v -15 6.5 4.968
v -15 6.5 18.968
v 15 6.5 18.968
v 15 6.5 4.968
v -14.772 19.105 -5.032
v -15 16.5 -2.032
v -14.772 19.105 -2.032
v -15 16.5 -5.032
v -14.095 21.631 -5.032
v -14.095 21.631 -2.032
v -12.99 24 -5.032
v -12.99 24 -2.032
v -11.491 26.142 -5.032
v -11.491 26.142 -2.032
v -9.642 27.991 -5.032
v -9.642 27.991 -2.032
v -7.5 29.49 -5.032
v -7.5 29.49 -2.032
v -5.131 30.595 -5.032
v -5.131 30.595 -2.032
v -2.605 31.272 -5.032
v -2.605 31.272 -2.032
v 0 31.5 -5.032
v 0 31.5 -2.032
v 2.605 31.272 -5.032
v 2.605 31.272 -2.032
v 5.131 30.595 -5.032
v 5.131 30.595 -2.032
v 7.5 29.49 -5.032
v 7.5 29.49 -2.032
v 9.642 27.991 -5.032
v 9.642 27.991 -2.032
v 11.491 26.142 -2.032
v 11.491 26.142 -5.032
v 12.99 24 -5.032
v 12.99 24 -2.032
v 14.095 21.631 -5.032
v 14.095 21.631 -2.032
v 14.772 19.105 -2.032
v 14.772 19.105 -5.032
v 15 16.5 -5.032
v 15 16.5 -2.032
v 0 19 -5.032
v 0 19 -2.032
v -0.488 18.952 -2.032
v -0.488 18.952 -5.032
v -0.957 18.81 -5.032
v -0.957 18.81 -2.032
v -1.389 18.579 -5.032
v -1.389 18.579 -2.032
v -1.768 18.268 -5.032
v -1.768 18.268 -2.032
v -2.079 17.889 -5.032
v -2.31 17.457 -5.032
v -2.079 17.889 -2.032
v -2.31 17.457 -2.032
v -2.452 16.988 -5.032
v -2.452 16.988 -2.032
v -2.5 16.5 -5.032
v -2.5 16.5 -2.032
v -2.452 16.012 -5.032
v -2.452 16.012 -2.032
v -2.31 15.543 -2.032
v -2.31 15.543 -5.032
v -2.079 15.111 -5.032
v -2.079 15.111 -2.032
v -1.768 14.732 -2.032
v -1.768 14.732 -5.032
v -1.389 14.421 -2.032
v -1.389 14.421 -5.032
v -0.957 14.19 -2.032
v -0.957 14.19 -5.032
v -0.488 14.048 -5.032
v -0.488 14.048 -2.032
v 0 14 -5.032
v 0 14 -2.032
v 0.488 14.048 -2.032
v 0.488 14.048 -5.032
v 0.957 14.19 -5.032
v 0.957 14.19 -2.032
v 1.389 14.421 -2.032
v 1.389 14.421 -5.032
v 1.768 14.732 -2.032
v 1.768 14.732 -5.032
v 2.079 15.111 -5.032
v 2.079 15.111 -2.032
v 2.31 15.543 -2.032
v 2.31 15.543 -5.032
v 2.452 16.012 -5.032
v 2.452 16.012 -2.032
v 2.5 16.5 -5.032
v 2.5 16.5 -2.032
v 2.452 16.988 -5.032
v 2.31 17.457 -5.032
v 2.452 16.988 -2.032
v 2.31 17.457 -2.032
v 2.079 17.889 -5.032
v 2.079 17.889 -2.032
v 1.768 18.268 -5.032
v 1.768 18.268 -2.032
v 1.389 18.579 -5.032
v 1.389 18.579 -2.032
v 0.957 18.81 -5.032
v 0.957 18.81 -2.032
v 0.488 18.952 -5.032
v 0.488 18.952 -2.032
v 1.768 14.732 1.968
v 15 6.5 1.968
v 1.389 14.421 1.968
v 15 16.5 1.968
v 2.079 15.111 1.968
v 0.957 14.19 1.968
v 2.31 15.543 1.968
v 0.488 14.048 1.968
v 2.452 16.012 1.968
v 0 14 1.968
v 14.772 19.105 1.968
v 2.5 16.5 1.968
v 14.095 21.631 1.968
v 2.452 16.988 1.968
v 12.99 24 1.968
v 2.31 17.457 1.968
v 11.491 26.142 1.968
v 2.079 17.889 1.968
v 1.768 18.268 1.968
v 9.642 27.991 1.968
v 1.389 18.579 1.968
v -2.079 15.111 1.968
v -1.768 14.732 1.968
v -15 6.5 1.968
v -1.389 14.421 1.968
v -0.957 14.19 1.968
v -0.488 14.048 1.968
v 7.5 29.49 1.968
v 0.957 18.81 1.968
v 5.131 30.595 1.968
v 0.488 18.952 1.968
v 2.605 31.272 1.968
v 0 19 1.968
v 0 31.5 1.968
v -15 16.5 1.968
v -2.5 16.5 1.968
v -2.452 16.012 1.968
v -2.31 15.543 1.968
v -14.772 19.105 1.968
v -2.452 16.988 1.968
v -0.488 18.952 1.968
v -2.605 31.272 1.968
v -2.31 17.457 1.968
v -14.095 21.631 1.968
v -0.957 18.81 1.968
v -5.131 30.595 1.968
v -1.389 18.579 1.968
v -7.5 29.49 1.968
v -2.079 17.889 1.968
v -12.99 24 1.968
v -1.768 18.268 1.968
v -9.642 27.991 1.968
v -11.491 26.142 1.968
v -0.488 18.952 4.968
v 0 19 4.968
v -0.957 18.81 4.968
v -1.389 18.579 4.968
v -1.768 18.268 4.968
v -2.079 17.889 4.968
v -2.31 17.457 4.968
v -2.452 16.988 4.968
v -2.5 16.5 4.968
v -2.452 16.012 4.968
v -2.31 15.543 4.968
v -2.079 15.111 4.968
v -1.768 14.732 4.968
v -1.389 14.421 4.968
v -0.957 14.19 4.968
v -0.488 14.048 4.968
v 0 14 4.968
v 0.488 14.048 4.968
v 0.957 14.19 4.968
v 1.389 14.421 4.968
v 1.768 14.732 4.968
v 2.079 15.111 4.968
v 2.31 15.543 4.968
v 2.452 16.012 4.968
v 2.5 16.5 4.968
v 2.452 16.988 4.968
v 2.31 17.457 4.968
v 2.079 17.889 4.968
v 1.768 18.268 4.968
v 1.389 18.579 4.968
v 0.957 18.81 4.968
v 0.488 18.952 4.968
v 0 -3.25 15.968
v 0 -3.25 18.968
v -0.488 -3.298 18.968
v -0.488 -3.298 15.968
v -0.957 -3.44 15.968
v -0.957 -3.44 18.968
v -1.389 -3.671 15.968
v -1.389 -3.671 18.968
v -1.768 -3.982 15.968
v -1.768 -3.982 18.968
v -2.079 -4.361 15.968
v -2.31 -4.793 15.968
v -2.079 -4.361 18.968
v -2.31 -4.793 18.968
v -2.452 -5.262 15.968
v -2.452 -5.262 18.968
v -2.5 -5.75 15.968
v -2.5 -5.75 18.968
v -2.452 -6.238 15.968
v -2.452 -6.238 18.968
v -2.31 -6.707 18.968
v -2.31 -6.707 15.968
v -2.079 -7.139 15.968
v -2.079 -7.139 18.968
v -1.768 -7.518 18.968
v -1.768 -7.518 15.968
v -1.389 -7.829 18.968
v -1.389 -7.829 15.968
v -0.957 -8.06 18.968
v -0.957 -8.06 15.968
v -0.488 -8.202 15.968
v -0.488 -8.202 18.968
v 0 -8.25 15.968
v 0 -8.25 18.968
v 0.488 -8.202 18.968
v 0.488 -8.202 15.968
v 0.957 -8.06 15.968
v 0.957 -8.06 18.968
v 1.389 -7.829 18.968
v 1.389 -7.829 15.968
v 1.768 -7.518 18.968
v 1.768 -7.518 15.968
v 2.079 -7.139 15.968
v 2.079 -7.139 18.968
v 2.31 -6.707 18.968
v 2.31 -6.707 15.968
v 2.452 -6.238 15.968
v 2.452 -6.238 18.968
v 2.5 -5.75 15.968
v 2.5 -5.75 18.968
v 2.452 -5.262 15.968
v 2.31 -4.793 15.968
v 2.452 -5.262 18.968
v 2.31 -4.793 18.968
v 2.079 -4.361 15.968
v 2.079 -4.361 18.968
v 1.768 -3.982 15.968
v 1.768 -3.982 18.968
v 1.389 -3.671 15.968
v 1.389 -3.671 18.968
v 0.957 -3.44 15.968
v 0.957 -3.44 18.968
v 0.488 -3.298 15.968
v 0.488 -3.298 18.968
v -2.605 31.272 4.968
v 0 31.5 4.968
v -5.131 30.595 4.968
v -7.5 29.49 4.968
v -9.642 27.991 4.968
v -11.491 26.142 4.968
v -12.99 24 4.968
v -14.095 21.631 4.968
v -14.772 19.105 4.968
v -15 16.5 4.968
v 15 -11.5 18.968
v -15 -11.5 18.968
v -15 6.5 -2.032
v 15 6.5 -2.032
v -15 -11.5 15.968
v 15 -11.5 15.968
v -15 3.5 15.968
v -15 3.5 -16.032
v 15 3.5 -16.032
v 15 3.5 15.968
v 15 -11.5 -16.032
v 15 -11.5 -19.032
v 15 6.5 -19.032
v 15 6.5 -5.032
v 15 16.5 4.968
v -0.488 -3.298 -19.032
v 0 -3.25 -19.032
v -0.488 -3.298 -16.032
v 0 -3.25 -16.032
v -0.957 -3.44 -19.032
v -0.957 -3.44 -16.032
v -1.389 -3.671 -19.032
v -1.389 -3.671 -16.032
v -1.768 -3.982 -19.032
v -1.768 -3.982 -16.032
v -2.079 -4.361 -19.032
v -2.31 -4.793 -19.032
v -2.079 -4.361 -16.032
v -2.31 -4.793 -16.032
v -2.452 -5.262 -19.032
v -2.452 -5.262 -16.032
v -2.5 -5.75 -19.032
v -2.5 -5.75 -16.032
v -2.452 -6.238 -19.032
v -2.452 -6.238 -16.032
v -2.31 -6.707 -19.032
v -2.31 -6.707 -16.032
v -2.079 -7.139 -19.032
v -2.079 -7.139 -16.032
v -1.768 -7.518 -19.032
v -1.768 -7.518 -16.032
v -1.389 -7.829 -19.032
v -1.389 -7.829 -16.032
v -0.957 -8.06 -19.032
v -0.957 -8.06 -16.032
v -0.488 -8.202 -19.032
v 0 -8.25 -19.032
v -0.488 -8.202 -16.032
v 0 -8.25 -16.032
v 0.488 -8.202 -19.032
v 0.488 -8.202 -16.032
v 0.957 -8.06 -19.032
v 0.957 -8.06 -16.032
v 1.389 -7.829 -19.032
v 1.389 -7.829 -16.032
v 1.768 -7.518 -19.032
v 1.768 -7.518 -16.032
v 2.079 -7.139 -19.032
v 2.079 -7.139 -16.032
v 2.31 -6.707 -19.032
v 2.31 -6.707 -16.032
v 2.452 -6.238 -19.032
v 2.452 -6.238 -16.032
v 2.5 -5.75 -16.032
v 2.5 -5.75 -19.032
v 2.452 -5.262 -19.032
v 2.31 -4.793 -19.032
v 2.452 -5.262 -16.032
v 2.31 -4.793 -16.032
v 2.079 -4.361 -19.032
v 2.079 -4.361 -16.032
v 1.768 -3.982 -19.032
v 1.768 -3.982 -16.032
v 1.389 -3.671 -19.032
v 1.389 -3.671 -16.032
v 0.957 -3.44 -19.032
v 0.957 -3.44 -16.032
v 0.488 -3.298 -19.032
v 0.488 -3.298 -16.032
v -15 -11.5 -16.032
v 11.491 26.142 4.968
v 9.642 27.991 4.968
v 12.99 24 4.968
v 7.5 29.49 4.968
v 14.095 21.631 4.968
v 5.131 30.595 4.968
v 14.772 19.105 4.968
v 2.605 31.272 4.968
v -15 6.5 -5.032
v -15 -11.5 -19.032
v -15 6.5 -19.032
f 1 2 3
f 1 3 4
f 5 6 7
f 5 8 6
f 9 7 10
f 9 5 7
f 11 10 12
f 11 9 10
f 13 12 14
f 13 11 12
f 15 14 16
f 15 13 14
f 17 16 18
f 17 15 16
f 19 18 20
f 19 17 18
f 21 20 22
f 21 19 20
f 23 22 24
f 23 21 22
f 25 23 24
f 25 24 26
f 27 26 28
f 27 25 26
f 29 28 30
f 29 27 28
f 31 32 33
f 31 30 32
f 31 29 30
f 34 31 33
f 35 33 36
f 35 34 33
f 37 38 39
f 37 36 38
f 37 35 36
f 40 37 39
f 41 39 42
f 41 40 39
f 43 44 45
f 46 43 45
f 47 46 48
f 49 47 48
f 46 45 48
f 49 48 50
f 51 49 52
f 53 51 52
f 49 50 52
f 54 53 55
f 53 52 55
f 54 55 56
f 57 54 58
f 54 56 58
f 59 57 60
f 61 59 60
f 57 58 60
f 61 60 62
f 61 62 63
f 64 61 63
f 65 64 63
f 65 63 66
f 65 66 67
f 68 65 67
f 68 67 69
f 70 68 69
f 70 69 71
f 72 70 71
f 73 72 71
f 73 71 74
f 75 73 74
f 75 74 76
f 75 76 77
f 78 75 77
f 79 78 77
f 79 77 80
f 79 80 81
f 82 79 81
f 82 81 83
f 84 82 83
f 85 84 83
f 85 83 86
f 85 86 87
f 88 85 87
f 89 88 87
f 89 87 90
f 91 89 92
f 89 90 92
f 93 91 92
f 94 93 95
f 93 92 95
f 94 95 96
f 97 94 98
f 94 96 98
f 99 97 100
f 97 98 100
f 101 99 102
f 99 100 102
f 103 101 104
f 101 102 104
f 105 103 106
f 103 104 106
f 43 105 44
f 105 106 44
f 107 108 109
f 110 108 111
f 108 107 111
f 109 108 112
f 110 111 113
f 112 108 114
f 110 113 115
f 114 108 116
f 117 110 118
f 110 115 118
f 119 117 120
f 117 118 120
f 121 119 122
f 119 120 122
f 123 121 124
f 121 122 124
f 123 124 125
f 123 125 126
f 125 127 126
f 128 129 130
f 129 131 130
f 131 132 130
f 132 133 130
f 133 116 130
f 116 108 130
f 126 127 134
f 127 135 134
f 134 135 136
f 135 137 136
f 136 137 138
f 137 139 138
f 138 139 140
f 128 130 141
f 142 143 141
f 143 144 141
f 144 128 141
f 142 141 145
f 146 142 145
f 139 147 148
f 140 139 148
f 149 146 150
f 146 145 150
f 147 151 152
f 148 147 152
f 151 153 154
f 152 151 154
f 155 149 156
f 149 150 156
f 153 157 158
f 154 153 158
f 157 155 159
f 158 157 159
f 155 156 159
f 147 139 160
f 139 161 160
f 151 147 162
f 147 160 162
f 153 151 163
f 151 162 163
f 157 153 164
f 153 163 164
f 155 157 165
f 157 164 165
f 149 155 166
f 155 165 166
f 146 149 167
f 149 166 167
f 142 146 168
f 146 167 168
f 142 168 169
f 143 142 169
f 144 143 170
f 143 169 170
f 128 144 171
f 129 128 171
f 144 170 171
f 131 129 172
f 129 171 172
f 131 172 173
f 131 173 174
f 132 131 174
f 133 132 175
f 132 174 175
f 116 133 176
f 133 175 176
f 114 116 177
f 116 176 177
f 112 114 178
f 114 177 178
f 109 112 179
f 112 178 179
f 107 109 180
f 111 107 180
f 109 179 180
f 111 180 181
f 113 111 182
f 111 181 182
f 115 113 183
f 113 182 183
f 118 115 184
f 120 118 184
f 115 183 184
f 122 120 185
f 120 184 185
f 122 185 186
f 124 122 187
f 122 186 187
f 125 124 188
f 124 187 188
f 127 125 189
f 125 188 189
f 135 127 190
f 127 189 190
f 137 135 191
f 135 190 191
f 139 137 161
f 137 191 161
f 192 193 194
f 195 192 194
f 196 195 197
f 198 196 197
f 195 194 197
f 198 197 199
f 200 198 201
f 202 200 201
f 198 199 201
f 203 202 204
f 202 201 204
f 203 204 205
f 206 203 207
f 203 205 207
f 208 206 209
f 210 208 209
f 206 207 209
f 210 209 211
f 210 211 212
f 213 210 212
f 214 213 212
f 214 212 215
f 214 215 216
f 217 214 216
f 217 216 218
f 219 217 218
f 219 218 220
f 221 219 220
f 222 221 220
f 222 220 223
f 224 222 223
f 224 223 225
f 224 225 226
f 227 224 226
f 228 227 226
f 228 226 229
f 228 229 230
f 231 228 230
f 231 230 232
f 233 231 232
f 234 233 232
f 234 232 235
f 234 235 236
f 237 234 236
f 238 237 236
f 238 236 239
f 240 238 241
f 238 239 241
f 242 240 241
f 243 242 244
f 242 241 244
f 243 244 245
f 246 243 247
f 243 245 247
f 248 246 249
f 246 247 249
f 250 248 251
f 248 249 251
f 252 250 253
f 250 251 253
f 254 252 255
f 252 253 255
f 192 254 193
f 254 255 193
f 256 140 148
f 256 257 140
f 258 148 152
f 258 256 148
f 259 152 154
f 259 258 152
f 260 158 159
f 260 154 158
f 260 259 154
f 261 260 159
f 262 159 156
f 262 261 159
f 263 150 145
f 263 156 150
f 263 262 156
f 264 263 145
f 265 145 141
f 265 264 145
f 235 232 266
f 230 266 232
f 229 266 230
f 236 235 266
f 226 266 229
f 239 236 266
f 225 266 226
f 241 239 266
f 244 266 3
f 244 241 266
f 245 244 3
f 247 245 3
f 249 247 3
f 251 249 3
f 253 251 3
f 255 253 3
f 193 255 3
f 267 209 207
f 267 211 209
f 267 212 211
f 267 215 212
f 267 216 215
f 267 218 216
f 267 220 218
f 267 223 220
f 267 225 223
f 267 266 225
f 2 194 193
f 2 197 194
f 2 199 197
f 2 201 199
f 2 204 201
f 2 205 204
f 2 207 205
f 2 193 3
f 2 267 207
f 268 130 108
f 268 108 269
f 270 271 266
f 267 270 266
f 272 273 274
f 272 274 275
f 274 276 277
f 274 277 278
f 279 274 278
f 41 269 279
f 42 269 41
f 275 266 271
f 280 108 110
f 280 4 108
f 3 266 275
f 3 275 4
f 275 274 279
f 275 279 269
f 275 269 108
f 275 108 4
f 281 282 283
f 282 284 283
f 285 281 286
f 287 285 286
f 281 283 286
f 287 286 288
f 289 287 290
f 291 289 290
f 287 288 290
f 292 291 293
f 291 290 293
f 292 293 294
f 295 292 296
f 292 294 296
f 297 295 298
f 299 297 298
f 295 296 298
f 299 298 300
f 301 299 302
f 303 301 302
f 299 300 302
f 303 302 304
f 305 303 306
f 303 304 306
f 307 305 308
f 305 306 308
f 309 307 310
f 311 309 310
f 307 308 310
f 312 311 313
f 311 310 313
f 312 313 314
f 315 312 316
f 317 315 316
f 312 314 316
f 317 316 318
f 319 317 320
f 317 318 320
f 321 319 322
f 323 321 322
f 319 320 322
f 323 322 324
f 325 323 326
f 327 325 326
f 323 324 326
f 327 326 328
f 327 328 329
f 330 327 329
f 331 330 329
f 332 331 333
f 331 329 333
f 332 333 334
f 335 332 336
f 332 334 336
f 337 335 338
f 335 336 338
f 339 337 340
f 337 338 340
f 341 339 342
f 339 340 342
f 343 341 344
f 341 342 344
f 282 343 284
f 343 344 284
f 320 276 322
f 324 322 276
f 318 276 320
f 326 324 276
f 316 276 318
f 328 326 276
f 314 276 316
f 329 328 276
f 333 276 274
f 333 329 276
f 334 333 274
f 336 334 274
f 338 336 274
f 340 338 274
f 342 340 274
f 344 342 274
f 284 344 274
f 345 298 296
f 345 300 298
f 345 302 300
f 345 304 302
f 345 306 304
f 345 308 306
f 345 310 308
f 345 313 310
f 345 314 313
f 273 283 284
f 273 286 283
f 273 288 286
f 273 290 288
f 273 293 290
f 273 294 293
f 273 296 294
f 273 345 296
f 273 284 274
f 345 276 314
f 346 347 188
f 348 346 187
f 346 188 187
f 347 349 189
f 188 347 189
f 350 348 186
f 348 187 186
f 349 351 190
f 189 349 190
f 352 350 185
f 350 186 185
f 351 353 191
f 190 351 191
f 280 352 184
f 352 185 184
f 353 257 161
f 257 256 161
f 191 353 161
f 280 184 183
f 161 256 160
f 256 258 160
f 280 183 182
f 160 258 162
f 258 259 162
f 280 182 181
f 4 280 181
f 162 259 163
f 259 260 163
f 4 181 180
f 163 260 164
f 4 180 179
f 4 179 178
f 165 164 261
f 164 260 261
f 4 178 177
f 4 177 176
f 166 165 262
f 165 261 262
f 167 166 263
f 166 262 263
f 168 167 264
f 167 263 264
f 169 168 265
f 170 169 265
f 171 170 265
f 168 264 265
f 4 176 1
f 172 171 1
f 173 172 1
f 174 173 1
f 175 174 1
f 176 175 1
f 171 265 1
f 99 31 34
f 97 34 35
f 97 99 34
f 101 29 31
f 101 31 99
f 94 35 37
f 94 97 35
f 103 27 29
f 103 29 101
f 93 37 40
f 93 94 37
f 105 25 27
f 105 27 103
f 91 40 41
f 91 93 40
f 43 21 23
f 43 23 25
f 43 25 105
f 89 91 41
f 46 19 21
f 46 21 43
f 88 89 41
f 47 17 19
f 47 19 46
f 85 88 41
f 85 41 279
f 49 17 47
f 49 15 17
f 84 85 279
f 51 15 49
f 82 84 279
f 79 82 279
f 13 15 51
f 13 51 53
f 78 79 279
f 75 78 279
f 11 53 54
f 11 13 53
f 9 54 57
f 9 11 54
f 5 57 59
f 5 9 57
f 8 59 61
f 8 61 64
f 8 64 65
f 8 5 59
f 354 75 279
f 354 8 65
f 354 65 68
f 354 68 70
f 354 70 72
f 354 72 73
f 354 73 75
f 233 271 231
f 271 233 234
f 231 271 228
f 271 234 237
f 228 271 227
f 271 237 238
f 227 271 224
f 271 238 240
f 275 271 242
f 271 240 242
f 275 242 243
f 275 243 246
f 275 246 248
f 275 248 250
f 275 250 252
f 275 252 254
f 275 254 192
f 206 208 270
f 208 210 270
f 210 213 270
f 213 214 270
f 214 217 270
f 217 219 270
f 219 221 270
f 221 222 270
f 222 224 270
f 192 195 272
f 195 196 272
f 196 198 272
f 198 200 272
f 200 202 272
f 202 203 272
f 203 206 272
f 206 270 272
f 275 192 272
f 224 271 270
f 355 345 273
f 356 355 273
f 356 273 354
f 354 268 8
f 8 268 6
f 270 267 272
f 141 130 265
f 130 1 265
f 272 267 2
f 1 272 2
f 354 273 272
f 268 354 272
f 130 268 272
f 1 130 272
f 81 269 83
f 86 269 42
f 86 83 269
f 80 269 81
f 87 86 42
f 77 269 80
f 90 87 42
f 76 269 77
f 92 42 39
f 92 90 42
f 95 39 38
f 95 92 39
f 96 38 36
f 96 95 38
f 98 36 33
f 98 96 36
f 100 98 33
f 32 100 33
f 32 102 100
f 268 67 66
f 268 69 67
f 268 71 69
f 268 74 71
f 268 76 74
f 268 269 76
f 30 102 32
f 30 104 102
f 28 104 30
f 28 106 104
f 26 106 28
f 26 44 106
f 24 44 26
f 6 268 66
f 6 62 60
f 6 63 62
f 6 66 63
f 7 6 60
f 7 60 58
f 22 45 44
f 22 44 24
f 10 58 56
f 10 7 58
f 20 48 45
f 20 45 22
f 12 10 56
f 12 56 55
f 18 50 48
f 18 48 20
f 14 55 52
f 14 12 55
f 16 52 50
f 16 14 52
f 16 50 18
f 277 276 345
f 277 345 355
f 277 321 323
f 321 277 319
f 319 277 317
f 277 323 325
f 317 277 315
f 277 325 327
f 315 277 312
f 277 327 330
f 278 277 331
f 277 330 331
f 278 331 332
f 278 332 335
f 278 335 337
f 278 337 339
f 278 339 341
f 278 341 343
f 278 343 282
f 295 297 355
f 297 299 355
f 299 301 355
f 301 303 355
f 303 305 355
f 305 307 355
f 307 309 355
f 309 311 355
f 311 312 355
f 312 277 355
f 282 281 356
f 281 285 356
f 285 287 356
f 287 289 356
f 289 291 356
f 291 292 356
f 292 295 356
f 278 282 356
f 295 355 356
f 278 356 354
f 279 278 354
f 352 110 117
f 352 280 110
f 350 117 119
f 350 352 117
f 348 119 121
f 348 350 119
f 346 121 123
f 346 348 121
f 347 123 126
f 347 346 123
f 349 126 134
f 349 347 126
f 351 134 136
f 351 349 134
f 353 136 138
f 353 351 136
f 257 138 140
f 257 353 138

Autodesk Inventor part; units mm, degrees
ref_plane "YZ Plane" through (0, 0, 0) normal (1, 0, 0) x (0, 1, 0)
ref_plane "XZ Plane" through (0, 0, 0) normal (0, 1, 0) x (-1, 0, 0)
ref_plane "XY Plane" through (0, 0, 0) normal (0, 0, 1) x (1, 0, 0)
sketch "Sketch2" plane through (0, 0, 0) normal (1, 0, 0) x (0, 1, 0)
  line L0 (0, -12.532) -> (0, 12.468) projected
  line L1 (0, 12.468) -> (3, 12.468) projected
  line L2 (3, -12.532) -> (3, 12.468) projected
  line L3 (0, -12.532) -> (3, -12.532) projected
  line L4 (-17, -12.532) -> (3, -12.532) projected
  line L5 (3, -12.532) -> (3, -15.532) projected
  line L6 (-17, -15.532) -> (3, -15.532) projected
  line L7 (-17, -12.532) -> (-17, -15.532) projected
  line L8 (3.5, -13.032) -> (3.5, -0.032)
  line L9 (-11.5, -16.032) -> (3.5, -16.032)
  line L10 (3.5, -13.032) -> (3.5, -16.032)
  line L11 (-11.5, -19.032) -> (6.5, -19.032)
  line L12 (3.5, -0.032) -> (6.5, -0.032) construction
  line L13 (-11.5, -16.032) -> (-11.5, -19.032)
  line L14 (6.5, -2.032) -> (31.5, -2.032)
  line L15 (31.5, -2.032) -> (31.5, -5.032)
  line L16 (31.5, -5.032) -> (6.5, -5.032)
  line L17 (3.5, 12.968) -> (3.5, -0.032)
  line L18 (-11.5, 15.968) -> (3.5, 15.968)
  line L19 (3.5, 12.968) -> (3.5, 15.968)
  line L20 (-11.5, 18.968) -> (6.5, 18.968)
  line L21 (-11.5, 15.968) -> (-11.5, 18.968)
  line L22 (6.5, 1.968) -> (31.5, 1.968)
  line L23 (31.5, 1.968) -> (31.5, 4.968)
  line L24 (31.5, 4.968) -> (6.5, 4.968)
  line L25 (3, 12.468) -> (-17, 12.468) projected
  line L26 (-17, 12.468) -> (-17, 15.468) projected
  line L27 (3, 15.468) -> (-17, 15.468) projected
  line L28 (3, 12.468) -> (3, 15.468) projected
  line L29 (6.5, 18.968) -> (6.5, 4.968)
  line L30 (6.5, 1.968) -> (6.5, -0.032)
  line L31 (6.5, -19.032) -> (6.5, -5.032)
  line L32 (6.5, -2.032) -> (6.5, -0.032)
  point P0 (0, 0)
  dimension "d0" = 0.5
  dimension "d1" = 0.5
  dimension "d3" = 15
  dimension "d4" = 3
  dimension "d5" = 19
  dimension "d7" = 25
  dimension "d8" = 2
  dimension "d9" = 3
  dimension "d11" = 3.5
extrude "Extrusion1" add sketch "Sketch2" along normal blind 15 and the other way blind 15 contours L8 L17 L19 L18 L21 L20 L29 L24 L23 L22 L30 L32 L14 L15 L16 L31 L11 L13 L9 L10
fillet "Fillet1" radius 15 4 edges at (-15, 31.5, -3.532) (-15, 31.5, 3.468) (15, 31.5, -3.532) (15, 31.5, 3.468)
sketch "Sketch3" plane through (15, 6.5, -19.032) normal (0, 0, -1) x (-1, 0, 0)
  line L0 (-110, -6.5) -> (140, -6.5) projected
  line L1 (0, -18) -> (30, -18) projected
  line L2 (0, -18) -> (0, 0) projected
  line L3 (30, 0) -> (30, -18) projected
  point P0 (15, -6.5)
  point P1 (15, -12.25)
  dimension "d17" = 5.75
  dimension "d18" = 15
hole "Hole1" at (0, -5.75, -19.032) direction (0, 0, 1) diameter 5 depth 300 tip angle 118
sketch "Sketch4" plane through (15, 6.5, -5.032) normal (0, 0, -1) x (-1, 0, 0)
  arc A0 (30, 10) -> (0, 10) centre (15, 10) ccw projected
  point P0 (15, -6.5)
hole "Hole2" at (0, 16.5, -5.032) direction (0, 0, 1) diameter 5 depth 300 tip angle 118
properties part number "Sujetador_Carril"
